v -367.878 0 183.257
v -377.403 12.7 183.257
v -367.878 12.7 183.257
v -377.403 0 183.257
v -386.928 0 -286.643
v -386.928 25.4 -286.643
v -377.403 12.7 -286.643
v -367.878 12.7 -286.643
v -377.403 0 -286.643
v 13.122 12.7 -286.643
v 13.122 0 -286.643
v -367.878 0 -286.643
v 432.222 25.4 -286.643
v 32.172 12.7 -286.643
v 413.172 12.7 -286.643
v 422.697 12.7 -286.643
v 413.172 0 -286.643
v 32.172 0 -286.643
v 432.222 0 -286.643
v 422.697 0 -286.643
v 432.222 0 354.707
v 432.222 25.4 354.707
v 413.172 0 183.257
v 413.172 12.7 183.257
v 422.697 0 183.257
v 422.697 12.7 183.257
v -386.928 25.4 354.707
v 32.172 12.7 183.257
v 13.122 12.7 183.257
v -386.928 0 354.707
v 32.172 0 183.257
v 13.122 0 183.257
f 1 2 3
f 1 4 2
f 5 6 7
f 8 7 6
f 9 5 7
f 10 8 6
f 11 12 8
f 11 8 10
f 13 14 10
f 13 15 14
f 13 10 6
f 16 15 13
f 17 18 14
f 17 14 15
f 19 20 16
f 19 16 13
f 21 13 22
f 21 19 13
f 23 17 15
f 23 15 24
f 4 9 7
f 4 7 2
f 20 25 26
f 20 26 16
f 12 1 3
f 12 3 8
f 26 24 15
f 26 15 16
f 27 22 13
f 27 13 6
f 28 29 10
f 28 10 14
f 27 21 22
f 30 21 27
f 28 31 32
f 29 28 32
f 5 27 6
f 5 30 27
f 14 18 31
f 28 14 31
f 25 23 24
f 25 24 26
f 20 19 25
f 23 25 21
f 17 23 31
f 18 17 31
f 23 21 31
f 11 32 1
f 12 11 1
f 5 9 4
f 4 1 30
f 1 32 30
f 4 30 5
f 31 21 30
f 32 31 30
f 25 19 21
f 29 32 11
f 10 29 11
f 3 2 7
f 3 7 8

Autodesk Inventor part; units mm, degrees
ref_plane "YZ Plane" through (0, 0, 0) normal (1, 0, 0) x (0, 1, 0)
ref_plane "XZ Plane" through (0, 0, 0) normal (0, 1, 0) x (-1, 0, 0)
ref_plane "XY Plane" through (0, 0, 0) normal (0, 0, 1) x (1, 0, 0)
sketch "Sketch1" plane through (0, 0, 0) normal (0, 1, 0) x (-1, 0, 0)
  line L0 (386.9283, -286.643) -> (-432.2217, -286.643)
  line L1 (-432.2217, -286.643) -> (-432.2217, 354.707)
  line L2 (-432.2217, 354.707) -> (386.9283, 354.707)
  line L3 (386.9283, 354.707) -> (386.9283, -286.643)
  point P0 (0, 0)
  dimension "d0" = 641.35
  dimension "d1" = 819.15
extrude "Board" add sketch "Sketch1" along normal blind 25.4
sketch "Sketch2" plane through (0, 0, 0) normal (0, -1, 0) x (1, 0, 0)
  line L0 (422.6967, -286.643) -> (413.1717, -286.643)
  line L1 (413.1717, -286.643) -> (413.1717, 183.257)
  line L2 (413.1717, 183.257) -> (422.6967, 183.257)
  line L3 (422.6967, 183.257) -> (422.6967, -286.643)
  line L4 (-367.8783, -286.643) -> (-377.4033, -286.643)
  line L5 (-377.4033, -286.643) -> (-377.4033, 183.257)
  line L6 (-377.4033, 183.257) -> (-367.8783, 183.257)
  line L7 (-367.8783, 183.257) -> (-367.8783, -286.643)
  line L8 (-386.9283, -286.643) -> (432.2217, -286.643) projected
  line L9 (432.2217, -286.643) -> (432.2217, 354.707) projected
  line L10 (-386.9283, -286.643) -> (-386.9283, 354.707) projected
  line L11 (13.1217, -286.643) -> (32.1717, -286.643)
  line L12 (32.1717, -286.643) -> (32.1717, 183.257)
  line L13 (32.1717, 183.257) -> (13.1217, 183.257)
  line L14 (13.1217, 183.257) -> (13.1217, -286.643)
  point P0 (0, 0)
  dimension "d4" = 469.9
  dimension "d5" = 9.525
  dimension "d6" = 9.525
  dimension "d7" = 9.525
  dimension "d10" = 19.05
  dimension "d11" = 819.15
  dimension "d12" = 400.05
  dimension "d14" = 400.05
extrude "Vertical Wall Stop Dado Notches" cut sketch "Sketch2" against normal blind 12.7
equation "\"d7\" = d6"
equation "\"d12\" = 0.5 * d11 - 0.5 * d10"
properties part number "Top"
